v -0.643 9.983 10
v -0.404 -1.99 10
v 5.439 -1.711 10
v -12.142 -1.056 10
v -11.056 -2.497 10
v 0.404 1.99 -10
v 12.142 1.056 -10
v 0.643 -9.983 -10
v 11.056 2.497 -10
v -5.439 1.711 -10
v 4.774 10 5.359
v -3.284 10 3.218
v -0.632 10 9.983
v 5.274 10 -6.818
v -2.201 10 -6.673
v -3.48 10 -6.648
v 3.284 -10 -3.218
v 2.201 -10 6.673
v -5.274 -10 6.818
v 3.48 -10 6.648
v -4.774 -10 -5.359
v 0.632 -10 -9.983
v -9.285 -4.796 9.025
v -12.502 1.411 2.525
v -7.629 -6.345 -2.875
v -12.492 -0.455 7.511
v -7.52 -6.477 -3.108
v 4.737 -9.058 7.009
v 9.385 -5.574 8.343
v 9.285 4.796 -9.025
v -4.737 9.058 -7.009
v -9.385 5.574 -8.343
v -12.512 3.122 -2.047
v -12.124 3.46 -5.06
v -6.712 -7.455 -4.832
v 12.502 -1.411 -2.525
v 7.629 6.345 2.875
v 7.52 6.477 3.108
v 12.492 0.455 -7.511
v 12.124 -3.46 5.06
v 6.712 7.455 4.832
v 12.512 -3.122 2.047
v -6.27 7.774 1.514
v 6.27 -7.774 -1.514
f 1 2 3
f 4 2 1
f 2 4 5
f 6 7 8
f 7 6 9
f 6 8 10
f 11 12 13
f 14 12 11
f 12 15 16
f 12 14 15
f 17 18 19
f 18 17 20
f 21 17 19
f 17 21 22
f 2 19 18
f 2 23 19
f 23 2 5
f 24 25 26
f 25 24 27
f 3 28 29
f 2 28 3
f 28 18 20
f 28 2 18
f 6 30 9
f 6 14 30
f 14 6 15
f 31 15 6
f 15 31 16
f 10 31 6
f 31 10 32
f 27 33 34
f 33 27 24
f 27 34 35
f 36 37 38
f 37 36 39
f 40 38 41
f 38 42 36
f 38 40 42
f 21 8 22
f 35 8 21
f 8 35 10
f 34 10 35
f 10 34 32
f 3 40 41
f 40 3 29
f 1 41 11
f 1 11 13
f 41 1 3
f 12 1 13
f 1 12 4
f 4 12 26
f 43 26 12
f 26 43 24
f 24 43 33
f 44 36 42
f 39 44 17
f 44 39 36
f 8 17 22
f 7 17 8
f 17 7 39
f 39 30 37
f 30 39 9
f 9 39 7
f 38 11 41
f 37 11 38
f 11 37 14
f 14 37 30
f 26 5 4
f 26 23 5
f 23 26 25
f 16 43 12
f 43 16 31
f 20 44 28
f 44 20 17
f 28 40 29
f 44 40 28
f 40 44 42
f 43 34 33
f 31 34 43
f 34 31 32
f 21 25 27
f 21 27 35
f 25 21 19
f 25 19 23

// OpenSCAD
echo(version = version());

intersection_for (i = [
    [0, 0, 0],
    [10, 20, 300],
    [200, 40, 57],
    [20, 88, 57]
])rotate(i) cube([100, 20, 20], center = true);

// Written by Clifford Wolf <clifford@clifford.at> and Marius
// Kintel <marius@kintel.net>
//
// To the extent possible under law, the author(s) have dedicated all
// copyright and related and neighboring rights to this software to the
// public domain worldwide. This software is distributed without any
// warranty.
//
// You should have received a copy of the CC0 Public Domain
// Dedication along with this software.
// If not, see <http://creativecommons.org/publicdomain/zero/1.0/>.
